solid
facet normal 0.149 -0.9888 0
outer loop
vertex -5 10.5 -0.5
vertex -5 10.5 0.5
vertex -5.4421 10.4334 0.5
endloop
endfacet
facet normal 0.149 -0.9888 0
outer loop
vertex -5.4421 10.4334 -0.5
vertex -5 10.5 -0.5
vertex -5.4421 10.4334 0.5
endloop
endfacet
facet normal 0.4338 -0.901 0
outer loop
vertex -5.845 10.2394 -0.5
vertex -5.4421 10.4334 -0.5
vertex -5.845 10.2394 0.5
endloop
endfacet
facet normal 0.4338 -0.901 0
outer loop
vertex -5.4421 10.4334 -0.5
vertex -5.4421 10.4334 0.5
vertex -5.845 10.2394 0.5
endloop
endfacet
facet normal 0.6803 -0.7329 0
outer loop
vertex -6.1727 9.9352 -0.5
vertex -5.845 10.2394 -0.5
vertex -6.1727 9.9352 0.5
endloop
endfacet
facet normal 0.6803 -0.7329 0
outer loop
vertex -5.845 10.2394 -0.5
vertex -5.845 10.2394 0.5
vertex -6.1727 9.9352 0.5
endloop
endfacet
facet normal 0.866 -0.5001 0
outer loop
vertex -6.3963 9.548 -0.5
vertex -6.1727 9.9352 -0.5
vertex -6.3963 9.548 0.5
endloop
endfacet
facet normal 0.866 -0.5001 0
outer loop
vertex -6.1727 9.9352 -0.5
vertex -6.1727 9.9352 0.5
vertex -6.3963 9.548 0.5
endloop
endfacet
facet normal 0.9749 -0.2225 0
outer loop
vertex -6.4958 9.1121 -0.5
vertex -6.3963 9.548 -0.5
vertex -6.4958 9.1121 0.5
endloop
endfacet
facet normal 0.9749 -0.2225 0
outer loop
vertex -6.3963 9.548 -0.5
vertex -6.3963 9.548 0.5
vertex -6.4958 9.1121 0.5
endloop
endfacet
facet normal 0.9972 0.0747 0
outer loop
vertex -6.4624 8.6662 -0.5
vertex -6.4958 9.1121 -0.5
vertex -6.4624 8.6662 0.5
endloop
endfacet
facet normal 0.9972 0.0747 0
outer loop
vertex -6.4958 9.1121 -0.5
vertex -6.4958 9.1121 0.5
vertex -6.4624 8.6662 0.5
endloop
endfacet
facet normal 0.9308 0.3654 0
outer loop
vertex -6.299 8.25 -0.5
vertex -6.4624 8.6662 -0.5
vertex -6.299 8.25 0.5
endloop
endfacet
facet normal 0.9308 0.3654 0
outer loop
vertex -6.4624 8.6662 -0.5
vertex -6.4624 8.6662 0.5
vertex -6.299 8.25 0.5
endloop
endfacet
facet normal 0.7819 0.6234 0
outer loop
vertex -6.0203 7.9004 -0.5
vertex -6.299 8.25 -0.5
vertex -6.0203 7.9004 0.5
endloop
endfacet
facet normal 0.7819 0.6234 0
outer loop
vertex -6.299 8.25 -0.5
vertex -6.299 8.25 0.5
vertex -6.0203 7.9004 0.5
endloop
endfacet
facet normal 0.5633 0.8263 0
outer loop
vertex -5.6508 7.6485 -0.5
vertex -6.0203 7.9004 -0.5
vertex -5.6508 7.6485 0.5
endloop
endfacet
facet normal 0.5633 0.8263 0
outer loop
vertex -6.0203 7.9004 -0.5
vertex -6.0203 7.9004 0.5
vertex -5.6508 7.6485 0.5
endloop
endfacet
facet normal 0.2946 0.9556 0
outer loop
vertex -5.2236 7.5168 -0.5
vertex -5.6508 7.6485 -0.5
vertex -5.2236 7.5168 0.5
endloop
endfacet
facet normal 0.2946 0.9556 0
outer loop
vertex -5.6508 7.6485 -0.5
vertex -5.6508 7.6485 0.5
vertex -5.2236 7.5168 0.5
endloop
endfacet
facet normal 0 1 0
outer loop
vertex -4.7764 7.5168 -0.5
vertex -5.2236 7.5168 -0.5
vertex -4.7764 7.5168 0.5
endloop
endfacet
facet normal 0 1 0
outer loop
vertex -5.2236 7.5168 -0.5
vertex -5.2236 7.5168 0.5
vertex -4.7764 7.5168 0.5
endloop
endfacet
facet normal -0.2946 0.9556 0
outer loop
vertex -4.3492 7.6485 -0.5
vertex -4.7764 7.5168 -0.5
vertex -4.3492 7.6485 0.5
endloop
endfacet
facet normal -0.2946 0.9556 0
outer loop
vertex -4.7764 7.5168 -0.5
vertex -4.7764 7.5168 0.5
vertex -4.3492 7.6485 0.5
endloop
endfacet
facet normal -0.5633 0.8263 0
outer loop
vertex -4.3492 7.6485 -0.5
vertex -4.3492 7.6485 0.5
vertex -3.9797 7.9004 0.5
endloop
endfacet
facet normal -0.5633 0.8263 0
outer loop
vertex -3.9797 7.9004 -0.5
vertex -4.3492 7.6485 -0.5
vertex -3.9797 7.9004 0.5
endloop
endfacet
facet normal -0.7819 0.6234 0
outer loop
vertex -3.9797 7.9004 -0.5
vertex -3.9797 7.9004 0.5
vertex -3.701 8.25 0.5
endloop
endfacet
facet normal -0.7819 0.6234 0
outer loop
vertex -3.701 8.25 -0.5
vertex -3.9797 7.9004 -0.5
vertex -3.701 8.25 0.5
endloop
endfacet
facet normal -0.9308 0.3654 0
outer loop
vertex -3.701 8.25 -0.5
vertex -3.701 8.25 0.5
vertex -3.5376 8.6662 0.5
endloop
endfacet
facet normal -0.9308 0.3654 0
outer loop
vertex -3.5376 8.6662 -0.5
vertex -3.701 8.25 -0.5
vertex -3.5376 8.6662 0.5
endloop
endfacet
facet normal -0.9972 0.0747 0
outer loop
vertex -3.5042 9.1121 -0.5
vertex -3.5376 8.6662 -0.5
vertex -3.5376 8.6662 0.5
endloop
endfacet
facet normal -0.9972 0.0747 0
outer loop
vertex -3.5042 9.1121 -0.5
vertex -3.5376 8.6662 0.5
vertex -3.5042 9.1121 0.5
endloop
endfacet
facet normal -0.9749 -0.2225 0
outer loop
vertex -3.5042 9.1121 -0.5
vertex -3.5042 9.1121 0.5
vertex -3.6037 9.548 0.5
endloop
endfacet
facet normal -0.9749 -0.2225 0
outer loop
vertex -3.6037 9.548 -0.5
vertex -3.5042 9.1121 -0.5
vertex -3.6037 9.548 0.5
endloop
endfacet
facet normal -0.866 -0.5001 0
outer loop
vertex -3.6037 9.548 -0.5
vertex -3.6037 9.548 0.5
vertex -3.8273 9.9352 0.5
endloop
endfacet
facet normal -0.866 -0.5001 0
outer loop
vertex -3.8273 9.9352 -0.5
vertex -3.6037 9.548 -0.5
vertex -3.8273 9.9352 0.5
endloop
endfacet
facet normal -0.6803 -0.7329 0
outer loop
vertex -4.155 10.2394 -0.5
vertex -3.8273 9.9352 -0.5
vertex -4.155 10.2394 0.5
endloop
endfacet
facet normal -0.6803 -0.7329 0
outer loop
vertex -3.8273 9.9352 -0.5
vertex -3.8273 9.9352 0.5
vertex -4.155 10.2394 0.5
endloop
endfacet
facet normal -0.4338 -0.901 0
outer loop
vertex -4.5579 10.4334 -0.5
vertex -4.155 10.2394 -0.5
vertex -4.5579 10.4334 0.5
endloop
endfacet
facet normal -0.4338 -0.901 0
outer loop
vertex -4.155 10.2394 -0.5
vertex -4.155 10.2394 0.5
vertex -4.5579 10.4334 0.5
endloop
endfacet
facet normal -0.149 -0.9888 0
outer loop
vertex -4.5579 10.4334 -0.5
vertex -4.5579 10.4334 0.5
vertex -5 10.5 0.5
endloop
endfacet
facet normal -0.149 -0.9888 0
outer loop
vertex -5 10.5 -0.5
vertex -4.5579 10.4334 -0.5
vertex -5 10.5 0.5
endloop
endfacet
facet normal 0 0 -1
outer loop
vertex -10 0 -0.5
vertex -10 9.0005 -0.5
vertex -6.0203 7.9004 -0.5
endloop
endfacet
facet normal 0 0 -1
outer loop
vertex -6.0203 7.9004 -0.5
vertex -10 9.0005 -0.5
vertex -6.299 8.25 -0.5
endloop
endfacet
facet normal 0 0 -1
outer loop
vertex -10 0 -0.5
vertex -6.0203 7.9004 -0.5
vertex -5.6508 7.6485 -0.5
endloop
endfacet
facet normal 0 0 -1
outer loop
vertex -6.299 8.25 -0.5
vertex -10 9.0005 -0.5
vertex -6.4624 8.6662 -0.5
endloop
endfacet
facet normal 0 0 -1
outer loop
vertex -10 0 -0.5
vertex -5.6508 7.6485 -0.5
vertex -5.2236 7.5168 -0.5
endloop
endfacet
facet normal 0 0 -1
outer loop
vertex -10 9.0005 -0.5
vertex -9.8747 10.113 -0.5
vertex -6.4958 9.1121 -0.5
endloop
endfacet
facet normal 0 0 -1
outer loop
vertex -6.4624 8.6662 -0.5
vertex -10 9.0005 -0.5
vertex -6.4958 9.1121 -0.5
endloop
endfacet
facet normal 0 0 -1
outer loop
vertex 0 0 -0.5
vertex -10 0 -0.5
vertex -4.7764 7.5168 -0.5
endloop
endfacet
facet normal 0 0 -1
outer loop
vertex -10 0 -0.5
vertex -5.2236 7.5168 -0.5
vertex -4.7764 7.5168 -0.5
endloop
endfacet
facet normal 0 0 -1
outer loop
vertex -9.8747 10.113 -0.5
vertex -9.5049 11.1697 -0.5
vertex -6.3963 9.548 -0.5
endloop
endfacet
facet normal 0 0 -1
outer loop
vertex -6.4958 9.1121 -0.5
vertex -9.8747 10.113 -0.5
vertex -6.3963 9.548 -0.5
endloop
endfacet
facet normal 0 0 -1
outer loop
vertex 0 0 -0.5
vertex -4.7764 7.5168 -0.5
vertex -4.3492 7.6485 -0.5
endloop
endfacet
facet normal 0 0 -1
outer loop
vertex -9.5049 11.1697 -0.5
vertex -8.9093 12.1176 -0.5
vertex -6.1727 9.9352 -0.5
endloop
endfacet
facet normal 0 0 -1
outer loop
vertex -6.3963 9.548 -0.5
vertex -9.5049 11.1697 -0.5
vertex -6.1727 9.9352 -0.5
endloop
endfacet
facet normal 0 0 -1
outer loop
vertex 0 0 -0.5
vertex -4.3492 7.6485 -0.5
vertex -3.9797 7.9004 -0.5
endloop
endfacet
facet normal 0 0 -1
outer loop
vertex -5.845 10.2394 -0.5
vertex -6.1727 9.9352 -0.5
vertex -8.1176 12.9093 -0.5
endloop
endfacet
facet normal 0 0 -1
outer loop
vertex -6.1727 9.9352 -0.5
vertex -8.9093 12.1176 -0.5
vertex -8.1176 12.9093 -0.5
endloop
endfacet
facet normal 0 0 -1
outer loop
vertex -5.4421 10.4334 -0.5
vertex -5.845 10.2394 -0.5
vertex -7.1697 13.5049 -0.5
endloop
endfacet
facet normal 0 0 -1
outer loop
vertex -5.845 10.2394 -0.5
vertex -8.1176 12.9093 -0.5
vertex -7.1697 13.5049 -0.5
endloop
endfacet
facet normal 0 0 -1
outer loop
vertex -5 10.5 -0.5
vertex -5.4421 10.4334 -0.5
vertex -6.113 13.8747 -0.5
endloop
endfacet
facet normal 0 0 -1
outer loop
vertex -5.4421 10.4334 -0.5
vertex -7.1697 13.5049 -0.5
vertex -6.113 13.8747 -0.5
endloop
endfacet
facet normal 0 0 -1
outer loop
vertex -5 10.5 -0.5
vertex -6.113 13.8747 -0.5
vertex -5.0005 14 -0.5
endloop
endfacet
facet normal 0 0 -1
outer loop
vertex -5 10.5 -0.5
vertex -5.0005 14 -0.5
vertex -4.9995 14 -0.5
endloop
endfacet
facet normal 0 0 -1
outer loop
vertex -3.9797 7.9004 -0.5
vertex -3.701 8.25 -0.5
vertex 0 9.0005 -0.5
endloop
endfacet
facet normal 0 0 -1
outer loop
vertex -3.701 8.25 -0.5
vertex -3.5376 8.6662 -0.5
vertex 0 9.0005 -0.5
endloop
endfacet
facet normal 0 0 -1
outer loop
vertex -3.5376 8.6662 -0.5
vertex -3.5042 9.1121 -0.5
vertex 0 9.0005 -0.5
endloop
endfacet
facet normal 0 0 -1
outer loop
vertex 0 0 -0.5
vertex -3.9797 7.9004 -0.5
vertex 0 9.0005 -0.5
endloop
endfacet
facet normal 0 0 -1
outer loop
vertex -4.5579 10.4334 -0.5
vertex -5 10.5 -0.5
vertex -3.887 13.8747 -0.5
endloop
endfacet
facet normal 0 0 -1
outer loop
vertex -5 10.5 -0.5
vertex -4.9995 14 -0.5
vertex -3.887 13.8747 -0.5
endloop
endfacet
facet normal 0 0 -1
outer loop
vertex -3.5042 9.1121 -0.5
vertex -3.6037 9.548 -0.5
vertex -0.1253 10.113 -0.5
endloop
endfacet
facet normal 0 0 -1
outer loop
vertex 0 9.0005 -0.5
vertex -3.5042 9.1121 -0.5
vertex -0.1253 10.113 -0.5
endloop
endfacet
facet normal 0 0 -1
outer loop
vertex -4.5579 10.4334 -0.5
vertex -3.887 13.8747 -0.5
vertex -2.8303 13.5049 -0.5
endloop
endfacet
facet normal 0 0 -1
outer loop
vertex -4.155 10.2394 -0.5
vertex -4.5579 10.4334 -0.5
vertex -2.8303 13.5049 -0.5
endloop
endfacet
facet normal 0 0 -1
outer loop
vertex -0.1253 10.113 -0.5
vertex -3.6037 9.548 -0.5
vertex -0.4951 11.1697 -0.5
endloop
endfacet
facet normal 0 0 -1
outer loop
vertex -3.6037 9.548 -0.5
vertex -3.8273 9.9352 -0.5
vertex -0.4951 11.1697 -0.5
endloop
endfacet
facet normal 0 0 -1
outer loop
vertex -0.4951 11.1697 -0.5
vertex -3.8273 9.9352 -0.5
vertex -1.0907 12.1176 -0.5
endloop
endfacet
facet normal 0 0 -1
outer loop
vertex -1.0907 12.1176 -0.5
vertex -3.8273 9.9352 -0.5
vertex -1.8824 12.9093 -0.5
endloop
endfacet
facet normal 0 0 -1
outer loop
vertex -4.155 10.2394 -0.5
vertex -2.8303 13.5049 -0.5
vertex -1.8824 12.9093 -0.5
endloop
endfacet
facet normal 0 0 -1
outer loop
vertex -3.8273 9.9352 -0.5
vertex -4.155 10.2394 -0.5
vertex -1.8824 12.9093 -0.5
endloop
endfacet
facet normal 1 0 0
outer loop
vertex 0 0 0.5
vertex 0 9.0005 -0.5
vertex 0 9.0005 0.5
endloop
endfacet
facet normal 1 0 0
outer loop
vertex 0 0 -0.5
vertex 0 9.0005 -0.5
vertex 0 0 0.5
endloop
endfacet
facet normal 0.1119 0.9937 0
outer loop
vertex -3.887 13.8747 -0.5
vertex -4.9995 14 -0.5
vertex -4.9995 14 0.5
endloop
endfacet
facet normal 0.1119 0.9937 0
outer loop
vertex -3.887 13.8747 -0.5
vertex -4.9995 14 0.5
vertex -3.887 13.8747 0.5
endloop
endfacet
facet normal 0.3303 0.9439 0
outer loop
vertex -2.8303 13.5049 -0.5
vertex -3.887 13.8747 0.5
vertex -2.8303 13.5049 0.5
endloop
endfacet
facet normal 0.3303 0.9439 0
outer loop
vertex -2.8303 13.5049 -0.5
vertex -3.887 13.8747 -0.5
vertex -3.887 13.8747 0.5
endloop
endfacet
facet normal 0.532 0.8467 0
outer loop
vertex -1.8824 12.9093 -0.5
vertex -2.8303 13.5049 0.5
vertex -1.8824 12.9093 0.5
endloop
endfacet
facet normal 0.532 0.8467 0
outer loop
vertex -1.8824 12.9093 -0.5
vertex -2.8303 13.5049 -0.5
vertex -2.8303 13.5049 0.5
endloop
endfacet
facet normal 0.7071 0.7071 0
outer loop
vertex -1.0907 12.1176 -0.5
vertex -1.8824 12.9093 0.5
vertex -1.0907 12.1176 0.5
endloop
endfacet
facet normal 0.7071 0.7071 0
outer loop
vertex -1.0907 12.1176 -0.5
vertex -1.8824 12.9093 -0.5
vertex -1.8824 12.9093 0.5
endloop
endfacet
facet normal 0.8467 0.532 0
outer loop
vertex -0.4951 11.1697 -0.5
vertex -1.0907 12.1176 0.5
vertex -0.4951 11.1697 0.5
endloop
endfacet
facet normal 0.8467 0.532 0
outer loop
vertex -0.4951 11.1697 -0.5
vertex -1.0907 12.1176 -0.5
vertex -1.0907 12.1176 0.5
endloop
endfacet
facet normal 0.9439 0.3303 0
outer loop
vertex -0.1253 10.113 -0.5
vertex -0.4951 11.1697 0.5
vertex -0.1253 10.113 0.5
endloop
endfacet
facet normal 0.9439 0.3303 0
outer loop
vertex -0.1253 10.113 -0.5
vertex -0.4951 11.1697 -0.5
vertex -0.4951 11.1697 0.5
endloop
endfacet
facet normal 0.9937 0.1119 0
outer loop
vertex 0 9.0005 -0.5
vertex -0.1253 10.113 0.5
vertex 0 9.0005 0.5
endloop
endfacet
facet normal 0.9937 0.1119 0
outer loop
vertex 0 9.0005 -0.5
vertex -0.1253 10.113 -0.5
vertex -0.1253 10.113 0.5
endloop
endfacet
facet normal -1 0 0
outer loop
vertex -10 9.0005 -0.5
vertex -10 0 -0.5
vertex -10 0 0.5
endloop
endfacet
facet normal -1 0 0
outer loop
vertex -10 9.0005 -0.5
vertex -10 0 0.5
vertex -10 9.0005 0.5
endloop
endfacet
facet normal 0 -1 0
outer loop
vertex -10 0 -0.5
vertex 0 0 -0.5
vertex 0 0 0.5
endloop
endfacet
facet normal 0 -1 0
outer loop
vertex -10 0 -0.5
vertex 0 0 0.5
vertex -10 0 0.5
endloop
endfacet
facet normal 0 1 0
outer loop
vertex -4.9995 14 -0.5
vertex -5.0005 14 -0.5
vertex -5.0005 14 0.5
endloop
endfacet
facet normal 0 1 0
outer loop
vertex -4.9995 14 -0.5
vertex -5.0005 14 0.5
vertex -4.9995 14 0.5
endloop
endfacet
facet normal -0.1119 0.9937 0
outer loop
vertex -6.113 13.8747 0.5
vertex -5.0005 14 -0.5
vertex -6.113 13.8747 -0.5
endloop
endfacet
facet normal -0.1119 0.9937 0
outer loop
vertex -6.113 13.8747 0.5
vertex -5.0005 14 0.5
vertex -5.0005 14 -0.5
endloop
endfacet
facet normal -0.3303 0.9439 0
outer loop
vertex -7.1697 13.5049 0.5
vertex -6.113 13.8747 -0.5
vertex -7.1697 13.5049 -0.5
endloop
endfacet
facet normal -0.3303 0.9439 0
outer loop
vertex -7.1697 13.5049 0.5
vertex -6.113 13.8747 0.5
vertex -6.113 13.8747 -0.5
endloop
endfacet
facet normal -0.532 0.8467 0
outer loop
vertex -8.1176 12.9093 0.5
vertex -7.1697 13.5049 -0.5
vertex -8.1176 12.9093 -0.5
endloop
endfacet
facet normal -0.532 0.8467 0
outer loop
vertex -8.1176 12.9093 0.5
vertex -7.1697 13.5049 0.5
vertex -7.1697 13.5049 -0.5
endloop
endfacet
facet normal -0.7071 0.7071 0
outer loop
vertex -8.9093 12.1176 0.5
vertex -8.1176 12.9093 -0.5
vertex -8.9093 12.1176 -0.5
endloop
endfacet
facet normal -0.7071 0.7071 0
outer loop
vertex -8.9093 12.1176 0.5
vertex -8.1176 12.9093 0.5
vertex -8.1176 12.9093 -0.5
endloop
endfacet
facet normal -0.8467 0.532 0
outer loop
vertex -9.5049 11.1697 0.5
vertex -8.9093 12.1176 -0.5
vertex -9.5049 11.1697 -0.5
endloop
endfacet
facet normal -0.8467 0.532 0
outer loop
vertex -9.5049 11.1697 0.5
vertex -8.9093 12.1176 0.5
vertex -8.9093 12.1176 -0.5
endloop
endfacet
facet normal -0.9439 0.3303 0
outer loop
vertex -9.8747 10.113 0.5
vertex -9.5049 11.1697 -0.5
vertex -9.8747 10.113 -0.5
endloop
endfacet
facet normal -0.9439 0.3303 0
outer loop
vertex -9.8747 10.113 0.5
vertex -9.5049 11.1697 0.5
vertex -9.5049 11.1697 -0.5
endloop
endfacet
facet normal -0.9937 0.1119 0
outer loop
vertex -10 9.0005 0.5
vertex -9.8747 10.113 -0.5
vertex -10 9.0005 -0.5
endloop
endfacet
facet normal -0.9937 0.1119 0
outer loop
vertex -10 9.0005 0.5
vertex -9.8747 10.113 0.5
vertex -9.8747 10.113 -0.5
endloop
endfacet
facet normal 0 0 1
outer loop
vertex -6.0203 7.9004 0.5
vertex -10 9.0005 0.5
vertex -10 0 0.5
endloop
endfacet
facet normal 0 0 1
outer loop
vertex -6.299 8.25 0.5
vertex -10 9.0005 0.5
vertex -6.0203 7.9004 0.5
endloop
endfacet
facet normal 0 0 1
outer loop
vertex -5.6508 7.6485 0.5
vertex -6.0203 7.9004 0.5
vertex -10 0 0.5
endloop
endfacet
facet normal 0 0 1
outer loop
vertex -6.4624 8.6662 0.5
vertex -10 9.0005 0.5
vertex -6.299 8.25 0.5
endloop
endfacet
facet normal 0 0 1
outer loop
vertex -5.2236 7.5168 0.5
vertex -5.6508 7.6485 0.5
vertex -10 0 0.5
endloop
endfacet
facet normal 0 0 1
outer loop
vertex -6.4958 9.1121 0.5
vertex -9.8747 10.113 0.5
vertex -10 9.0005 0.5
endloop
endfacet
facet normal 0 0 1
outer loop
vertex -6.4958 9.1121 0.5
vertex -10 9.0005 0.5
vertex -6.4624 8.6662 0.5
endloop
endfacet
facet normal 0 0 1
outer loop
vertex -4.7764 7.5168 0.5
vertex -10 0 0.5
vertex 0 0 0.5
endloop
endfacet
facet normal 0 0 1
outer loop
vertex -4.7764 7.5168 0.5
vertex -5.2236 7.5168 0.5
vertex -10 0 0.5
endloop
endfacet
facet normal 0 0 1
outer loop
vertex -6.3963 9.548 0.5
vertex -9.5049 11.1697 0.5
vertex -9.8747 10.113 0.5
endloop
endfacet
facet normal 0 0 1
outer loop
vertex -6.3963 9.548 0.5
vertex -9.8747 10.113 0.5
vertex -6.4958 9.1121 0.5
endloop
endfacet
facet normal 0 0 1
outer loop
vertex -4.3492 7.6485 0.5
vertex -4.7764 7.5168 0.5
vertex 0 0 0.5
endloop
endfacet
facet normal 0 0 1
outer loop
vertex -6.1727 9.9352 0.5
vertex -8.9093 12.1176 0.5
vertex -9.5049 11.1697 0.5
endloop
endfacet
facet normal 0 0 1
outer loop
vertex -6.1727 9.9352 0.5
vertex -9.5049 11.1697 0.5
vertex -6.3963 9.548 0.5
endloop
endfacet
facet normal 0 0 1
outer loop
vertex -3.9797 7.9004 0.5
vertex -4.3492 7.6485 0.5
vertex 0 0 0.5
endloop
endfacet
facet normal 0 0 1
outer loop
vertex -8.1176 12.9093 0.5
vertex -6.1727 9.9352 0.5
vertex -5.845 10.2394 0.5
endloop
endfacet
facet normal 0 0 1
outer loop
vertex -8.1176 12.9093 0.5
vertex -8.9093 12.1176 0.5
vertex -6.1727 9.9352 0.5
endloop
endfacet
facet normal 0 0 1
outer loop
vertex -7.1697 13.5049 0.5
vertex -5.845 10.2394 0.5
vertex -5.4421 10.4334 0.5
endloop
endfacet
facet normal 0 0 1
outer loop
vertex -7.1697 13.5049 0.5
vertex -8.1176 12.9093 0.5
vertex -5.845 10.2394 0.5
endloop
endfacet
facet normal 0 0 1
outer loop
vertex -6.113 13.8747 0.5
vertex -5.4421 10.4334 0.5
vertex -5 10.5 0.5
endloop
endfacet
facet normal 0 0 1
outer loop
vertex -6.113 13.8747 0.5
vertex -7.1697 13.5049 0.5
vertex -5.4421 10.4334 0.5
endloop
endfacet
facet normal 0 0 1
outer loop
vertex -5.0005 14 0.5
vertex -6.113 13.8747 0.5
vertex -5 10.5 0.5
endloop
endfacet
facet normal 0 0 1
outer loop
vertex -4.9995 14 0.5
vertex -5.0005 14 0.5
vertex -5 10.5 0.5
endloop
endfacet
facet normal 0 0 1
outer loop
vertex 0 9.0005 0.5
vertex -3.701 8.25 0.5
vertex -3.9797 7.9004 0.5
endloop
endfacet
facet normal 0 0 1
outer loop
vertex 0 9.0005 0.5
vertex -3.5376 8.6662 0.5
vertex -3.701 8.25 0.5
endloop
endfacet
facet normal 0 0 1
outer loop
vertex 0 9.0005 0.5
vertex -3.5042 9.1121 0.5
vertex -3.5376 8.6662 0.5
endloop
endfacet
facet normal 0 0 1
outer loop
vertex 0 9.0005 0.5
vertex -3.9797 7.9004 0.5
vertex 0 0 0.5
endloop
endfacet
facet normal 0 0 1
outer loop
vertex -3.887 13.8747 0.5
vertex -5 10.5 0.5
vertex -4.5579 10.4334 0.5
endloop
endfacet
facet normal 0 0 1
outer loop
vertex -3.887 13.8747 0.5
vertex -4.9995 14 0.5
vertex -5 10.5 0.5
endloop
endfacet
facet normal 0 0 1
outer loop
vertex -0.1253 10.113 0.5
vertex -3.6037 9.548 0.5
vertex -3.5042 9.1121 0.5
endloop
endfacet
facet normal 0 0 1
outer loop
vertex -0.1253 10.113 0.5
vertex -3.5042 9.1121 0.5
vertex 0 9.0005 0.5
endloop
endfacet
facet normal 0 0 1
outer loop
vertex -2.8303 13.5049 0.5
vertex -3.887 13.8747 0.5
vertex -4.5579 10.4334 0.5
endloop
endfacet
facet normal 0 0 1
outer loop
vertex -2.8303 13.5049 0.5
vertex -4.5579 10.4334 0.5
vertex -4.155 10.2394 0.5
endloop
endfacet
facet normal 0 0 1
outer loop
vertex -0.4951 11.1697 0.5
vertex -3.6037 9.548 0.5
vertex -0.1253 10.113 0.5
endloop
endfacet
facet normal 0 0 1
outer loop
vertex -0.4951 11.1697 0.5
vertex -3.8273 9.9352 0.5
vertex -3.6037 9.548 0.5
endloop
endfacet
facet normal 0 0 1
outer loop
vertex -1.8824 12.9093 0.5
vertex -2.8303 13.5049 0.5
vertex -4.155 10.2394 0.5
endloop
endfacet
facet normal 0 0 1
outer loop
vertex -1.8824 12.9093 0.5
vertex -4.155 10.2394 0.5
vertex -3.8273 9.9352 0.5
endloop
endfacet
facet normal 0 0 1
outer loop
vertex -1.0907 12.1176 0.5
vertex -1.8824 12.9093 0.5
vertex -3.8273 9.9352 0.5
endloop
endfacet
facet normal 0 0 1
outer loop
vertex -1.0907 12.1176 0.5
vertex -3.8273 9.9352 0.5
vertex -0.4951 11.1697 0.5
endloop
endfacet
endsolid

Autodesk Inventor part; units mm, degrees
ref_plane "YZ Plane" through (0, 0, 0) normal (1, 0, 0) x (0, 1, 0)
ref_plane "XZ Plane" through (0, 0, 0) normal (0, 1, 0) x (-1, 0, 0)
ref_plane "XY Plane" through (0, 0, 0) normal (0, 0, 1) x (1, 0, 0)
sketch "Szkic1" plane through (0, 0, 0) normal (0, 0, 1) x (1, 0, 0)
  line L0 (-10, 14) -> (0, 14)
  line L1 (0, 14) -> (0, 0)
  line L2 (0, 0) -> (-10, 0)
  line L3 (-10, 0) -> (-10, 14)
  point P0 (-5, 9)
  dimension "d0" = 10
  dimension "d5" = 5
  dimension "d6" = 5
  dimension "d7" = 9
extrude "Wyciągnięcie proste1" add sketch "Szkic1" along normal mid plane 1
fillet "Zaokrąglenie1" radius 5 2 edges at (0, 14, 0) (-10, 14, 0)
hole "Otwór1" at (-5, 9, 0) direction (0, 0, 1) diameter 3 end through all both
properties part number "podporka"
